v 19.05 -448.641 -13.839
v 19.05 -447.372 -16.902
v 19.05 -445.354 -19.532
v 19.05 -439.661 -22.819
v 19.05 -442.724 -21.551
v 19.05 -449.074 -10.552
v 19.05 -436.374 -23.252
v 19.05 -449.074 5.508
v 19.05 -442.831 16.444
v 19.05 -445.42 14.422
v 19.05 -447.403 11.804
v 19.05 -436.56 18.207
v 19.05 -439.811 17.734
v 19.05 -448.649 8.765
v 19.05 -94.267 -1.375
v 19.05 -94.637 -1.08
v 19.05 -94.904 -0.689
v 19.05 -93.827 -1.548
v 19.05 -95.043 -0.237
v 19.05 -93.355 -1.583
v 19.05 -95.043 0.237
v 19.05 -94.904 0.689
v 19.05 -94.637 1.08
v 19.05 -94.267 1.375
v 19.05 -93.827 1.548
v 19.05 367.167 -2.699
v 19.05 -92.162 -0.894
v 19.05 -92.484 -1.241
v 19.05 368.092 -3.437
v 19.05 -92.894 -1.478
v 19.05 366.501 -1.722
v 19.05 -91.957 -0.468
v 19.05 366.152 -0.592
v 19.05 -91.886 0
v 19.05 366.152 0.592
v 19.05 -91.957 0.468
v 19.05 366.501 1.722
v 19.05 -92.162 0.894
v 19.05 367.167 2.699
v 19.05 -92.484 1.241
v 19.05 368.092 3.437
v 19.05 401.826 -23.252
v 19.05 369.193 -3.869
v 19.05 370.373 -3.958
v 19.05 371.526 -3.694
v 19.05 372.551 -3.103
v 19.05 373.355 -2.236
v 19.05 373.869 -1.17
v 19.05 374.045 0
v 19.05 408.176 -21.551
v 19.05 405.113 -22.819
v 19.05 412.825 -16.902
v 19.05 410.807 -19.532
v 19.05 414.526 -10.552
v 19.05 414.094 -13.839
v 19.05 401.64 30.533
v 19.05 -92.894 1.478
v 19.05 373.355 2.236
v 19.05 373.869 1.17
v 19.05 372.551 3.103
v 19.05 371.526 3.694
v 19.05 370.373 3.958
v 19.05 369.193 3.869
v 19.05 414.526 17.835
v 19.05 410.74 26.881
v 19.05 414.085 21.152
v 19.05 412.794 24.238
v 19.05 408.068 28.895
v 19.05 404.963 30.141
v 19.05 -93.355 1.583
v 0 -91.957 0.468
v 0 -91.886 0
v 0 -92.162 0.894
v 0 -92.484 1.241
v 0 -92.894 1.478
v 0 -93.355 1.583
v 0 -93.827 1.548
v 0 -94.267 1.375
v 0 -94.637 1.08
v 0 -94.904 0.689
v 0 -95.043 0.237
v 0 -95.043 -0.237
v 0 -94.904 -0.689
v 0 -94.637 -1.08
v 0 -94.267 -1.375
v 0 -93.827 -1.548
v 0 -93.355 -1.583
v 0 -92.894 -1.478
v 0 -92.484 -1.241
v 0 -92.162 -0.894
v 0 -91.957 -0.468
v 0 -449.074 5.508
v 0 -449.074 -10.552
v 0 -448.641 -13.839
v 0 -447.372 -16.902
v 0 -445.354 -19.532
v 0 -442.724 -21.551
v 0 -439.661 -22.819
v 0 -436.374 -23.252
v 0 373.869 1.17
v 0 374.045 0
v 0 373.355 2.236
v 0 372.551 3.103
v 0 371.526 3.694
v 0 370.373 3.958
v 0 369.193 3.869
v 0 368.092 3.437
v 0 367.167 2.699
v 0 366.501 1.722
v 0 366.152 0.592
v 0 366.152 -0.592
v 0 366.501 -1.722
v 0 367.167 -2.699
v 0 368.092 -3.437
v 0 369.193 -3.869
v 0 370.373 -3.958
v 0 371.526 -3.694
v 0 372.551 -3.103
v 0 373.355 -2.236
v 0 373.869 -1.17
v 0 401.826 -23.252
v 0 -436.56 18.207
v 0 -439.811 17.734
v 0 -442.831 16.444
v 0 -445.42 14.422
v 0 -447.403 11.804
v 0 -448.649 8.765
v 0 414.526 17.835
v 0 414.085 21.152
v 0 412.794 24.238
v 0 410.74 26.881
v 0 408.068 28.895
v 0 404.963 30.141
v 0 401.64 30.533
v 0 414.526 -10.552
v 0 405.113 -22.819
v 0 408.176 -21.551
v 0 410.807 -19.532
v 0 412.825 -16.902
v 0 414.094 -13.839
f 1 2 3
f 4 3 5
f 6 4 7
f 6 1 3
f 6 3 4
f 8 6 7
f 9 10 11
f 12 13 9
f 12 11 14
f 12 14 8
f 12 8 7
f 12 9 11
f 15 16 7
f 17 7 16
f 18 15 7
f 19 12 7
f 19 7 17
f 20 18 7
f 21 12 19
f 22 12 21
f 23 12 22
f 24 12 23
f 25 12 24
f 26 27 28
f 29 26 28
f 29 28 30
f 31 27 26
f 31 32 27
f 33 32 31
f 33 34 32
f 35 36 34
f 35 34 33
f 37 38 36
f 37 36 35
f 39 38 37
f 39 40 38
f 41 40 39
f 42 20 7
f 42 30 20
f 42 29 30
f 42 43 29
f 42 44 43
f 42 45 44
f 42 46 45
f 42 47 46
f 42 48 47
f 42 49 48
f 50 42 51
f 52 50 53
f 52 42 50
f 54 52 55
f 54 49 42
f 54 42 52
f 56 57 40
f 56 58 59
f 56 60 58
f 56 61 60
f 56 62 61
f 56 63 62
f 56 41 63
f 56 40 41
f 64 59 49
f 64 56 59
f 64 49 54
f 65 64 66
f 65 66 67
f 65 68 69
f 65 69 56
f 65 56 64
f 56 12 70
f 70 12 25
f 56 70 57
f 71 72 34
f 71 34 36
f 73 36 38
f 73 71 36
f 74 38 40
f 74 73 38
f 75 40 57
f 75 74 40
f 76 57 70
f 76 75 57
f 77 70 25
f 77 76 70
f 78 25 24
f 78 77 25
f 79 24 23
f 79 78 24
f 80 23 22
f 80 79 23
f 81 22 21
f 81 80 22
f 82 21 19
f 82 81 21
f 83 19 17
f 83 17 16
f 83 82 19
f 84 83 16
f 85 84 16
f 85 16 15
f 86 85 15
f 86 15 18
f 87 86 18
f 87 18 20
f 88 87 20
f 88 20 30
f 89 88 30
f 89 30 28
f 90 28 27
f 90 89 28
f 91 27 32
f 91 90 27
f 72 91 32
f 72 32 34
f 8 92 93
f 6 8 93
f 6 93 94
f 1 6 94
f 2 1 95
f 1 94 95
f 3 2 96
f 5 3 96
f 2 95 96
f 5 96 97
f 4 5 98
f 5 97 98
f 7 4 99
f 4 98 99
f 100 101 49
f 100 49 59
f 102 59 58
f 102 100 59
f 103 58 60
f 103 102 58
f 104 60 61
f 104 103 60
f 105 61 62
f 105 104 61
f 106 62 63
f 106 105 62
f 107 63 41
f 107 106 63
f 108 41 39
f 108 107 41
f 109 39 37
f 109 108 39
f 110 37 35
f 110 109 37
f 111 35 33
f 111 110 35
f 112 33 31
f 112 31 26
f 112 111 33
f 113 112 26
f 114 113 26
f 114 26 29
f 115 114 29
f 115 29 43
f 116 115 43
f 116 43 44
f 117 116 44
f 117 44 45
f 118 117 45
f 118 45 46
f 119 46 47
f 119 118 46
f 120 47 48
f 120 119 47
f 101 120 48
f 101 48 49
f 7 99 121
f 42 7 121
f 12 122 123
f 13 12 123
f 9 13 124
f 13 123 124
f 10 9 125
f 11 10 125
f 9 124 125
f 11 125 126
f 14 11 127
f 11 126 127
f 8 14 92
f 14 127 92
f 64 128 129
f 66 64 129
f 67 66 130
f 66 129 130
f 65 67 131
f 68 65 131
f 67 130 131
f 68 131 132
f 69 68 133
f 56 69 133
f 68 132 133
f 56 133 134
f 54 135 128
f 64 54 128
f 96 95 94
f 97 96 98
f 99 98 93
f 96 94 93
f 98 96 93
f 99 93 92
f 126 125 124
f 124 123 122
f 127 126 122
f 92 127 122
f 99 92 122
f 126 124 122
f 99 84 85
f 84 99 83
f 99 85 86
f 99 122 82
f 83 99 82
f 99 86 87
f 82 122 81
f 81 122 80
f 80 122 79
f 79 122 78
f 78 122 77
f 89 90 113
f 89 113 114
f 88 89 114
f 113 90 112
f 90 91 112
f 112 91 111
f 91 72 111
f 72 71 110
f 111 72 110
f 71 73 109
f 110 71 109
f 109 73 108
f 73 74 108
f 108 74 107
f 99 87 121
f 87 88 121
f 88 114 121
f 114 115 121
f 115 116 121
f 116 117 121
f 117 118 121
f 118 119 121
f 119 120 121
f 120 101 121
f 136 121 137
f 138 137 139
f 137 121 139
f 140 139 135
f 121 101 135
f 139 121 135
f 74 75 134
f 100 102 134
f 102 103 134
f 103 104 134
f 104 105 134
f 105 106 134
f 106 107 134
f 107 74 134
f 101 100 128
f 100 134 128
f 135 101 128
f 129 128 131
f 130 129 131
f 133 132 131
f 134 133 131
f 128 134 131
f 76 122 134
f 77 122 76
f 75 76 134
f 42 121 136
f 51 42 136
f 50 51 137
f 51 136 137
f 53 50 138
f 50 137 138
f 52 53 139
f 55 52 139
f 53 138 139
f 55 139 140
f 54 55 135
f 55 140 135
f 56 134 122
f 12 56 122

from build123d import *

# Parameters (mm, degrees)
F0_R     = 1.5875
F0_R_2   = 3.96875
F1_DEPTH = 19.05
F2_R     = 1.5875
F3_DEPTH = 52.578


with BuildPart() as f1:
    # F0 (on Right) → F1 (new body)
    with BuildSketch(Plane.YZ):
        with BuildLine():
            Line((414.526317, -10.552206), (414.526317, 17.834656))
            ThreePointArc((414.526317, 17.834656), (410.740304, 26.880696), (401.639572, 30.533283))
            Line((401.639572, 30.533283), (-436.560428, 18.206813))
            ThreePointArc((-436.560428, 18.206813), (-445.419722, 14.422173), (-449.073683, 5.508186))
            Line((-449.073683, 5.508186), (-449.073683, -10.552206))
            ThreePointArc((-449.073683, -10.552206), (-445.353939, -19.532462), (-436.373683, -23.252206))
            Line((-436.373683, -23.252206), (401.826317, -23.252206))
            ThreePointArc((401.826317, -23.252206), (410.806573, -19.532462), (414.526317, -10.552206))
        make_face()
        with Locations((-93.473683, 0)):
            Circle(F0_R, mode=Mode.SUBTRACT)
        with Locations((370.076317, 0)):
            Circle(F0_R_2, mode=Mode.SUBTRACT)
    extrude(amount=F1_DEPTH)

    # F2 (on face) → F3 (cut)
    with BuildSketch(Plane(origin=(0, 0, -23.252206), x_dir=(1, 0, 0), z_dir=(0, 0, -1))):
        with Locations((9.525, -668.526317)):
            Circle(F2_R)
    extrude(amount=-F3_DEPTH, mode=Mode.SUBTRACT)


solid = f1.part
